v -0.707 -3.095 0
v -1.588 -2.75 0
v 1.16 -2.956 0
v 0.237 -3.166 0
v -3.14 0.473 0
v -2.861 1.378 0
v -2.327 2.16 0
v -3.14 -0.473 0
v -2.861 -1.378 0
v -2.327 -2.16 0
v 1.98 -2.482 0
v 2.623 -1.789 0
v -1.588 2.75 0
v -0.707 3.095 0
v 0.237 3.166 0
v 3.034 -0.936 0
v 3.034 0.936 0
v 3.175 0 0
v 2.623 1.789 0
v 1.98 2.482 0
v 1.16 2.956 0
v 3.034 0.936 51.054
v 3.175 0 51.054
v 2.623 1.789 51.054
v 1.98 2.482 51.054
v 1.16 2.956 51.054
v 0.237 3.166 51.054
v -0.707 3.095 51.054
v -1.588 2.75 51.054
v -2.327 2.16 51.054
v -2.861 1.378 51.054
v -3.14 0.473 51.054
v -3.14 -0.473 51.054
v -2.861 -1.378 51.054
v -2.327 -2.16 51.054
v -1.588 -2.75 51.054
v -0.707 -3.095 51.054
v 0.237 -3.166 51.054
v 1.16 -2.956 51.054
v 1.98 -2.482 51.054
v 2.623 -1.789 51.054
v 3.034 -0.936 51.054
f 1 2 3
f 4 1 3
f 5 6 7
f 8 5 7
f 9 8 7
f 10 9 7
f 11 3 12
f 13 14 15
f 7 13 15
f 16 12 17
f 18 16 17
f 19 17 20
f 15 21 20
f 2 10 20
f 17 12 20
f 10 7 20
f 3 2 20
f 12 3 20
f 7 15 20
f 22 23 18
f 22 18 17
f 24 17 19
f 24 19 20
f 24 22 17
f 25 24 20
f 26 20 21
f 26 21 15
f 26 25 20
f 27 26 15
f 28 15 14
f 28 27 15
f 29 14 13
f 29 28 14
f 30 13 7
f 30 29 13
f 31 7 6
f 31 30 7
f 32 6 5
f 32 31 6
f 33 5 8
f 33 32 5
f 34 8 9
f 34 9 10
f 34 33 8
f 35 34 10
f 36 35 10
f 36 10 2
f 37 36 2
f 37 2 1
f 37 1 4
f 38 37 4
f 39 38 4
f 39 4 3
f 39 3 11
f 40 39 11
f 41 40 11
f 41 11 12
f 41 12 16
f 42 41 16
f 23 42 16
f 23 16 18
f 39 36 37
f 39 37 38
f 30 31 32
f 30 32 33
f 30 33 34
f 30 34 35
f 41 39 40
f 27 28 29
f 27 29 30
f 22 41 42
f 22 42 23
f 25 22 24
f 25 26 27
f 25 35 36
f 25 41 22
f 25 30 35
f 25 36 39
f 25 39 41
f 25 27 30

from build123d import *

# Parameters (mm, degrees)
F0_R     = 3.175
F1_DEPTH = 57.15
F2_DEPTH = 2.54
F3_DEPTH = 3.81
F4_DEPTH = 2.286


with BuildPart() as f1:
    # F0 (on Top) → F1 (new body)
    with BuildSketch(Plane.XY):
        Circle(F0_R)
    extrude(amount=F1_DEPTH)

    # F2 (add): a face of the model
    f2_faces = [f1.faces().sort_by_distance(p)[0] for p in [
        (0, 0, 57.15),
    ]]
    extrude(f2_faces, amount=-F2_DEPTH)

    # F3 (cut): a face of the model
    f3_faces = [f1.faces().sort_by_distance(p)[0] for p in [
        (0, 0, 57.15),
    ]]
    extrude(f3_faces, amount=-F3_DEPTH, mode=Mode.SUBTRACT)

    # F4 (cut): a face of the model
    f4_faces = [f1.faces().sort_by_distance(p)[0] for p in [
        (0, 0, 53.34),
    ]]
    extrude(f4_faces, amount=-F4_DEPTH, mode=Mode.SUBTRACT)


solid = f1.part
